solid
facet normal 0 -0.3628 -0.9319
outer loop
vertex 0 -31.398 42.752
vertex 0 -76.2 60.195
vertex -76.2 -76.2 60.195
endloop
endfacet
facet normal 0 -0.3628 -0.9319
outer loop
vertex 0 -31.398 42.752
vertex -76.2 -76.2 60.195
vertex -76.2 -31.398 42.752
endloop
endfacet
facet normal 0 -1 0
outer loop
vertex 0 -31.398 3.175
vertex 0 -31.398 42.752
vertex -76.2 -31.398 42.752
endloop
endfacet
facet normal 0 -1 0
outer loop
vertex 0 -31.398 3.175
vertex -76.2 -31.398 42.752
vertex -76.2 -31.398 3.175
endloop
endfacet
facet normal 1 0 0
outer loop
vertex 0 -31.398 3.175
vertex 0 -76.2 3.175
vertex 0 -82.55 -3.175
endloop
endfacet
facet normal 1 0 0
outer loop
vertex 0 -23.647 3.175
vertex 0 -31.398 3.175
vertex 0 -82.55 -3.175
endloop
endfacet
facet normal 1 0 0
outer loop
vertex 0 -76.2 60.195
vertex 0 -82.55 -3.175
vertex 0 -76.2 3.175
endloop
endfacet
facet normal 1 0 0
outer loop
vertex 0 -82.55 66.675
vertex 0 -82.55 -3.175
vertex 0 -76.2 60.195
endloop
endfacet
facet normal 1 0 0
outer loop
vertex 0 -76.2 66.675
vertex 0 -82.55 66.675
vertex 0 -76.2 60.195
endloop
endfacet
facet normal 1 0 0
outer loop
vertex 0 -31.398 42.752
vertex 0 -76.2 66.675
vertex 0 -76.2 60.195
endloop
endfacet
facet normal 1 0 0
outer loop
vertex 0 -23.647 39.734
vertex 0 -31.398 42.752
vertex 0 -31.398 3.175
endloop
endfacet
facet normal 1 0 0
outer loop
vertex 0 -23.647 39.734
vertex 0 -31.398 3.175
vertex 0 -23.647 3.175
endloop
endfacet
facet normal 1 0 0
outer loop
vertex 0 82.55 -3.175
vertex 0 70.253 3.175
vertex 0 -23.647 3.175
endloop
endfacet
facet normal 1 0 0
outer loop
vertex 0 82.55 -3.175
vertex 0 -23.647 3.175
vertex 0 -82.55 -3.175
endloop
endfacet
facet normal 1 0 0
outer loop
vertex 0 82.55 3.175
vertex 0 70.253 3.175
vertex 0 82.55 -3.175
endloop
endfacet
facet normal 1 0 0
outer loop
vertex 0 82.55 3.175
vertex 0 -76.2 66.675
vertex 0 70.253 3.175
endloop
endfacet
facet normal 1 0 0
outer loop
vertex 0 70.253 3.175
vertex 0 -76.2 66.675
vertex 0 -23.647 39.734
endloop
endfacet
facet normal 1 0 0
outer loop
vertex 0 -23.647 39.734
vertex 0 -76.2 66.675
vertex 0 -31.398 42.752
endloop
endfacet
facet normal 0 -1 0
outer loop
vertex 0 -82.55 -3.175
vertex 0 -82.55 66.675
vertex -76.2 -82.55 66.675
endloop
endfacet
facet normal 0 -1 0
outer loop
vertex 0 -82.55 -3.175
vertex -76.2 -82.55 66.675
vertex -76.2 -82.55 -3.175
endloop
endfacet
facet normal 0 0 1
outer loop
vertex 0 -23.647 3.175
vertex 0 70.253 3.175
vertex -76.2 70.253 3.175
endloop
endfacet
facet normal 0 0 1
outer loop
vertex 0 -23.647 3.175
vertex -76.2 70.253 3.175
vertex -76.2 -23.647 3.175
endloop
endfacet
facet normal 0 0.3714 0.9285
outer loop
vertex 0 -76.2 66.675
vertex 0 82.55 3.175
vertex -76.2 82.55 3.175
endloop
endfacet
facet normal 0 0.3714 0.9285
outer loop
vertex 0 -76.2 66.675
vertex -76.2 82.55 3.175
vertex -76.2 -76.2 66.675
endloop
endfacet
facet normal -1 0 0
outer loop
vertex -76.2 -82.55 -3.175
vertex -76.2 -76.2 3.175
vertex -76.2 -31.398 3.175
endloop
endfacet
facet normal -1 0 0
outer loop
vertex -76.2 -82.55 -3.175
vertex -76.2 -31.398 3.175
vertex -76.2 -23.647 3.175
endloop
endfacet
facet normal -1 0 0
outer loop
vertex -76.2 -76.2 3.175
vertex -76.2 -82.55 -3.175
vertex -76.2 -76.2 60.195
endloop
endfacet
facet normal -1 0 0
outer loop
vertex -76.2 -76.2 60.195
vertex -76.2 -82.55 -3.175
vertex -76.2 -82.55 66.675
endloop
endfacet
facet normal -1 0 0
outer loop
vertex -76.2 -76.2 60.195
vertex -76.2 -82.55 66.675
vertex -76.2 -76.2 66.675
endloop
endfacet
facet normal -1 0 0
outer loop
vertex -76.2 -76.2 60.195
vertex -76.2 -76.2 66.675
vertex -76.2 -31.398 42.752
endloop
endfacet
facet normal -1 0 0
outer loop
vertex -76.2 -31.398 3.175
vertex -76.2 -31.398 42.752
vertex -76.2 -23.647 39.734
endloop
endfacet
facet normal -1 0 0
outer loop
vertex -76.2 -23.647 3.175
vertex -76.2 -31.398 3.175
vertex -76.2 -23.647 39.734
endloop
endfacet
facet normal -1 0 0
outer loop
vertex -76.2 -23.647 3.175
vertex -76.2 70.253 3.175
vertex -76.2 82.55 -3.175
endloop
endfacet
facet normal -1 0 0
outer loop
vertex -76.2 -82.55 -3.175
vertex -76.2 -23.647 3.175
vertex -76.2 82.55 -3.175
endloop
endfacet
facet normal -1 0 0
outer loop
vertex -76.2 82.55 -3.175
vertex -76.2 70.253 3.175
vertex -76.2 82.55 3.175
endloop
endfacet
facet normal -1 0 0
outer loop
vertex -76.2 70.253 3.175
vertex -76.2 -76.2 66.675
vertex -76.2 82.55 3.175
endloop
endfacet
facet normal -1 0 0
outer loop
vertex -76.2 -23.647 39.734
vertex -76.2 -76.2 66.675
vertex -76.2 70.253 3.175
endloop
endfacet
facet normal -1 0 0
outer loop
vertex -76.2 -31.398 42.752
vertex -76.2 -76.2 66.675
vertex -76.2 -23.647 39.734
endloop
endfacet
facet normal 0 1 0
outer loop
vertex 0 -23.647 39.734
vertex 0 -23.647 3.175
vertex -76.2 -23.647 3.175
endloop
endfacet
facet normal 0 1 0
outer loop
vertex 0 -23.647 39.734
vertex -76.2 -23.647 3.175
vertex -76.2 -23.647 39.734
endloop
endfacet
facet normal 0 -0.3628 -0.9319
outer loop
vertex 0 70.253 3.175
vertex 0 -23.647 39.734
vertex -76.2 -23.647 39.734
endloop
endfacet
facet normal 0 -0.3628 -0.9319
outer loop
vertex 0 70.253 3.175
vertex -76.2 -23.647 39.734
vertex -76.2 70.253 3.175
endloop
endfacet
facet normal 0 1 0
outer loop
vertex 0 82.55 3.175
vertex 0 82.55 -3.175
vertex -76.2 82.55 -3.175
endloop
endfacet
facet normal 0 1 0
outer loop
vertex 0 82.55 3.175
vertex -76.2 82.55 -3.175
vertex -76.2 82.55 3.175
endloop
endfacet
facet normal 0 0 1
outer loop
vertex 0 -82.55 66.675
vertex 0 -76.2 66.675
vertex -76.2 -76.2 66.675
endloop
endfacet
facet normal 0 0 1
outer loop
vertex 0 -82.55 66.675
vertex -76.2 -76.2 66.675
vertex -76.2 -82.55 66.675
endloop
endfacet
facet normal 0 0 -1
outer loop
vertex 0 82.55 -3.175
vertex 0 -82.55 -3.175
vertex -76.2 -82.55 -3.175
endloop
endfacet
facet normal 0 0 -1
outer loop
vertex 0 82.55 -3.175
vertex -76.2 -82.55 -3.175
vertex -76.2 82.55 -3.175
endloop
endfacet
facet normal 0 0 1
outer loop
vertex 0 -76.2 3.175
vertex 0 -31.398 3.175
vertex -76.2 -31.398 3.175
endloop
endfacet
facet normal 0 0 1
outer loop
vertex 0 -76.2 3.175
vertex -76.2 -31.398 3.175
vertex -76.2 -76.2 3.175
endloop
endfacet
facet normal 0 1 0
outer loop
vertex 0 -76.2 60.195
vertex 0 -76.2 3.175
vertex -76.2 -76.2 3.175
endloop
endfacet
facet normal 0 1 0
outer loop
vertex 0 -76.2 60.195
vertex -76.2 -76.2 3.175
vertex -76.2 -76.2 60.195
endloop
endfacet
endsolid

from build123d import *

# Parameters (mm, degrees)
F1_DEPTH = 76.2


with BuildPart() as f1:
    # F0 (on Right) → F1 (new body)
    with BuildSketch(Plane.YZ):
        Polygon((-82.55, 66.675), (-82.55, 3.175), (-76.2, 3.175), (-76.2, 60.195141), (-76.2, 66.675), align=None)
        Polygon((-76.2, 3.175), (-82.55, 3.175), (-82.55, -3.175), (82.55, -3.175), (82.55, 3.175), (70.252687, 3.175), (-23.647007, 3.175), (-31.397808, 3.175), align=None)
        Polygon((-76.2, 66.675), (-76.2, 60.195141), (-31.397808, 42.751778), (-23.647007, 39.734068), (70.252687, 3.175), (82.55, 3.175), align=None)
        Polygon((-31.397808, 42.751778), (-31.397808, 3.175), (-23.647007, 3.175), (-23.647007, 39.734068), align=None)
    extrude(amount=-F1_DEPTH)


solid = f1.part
